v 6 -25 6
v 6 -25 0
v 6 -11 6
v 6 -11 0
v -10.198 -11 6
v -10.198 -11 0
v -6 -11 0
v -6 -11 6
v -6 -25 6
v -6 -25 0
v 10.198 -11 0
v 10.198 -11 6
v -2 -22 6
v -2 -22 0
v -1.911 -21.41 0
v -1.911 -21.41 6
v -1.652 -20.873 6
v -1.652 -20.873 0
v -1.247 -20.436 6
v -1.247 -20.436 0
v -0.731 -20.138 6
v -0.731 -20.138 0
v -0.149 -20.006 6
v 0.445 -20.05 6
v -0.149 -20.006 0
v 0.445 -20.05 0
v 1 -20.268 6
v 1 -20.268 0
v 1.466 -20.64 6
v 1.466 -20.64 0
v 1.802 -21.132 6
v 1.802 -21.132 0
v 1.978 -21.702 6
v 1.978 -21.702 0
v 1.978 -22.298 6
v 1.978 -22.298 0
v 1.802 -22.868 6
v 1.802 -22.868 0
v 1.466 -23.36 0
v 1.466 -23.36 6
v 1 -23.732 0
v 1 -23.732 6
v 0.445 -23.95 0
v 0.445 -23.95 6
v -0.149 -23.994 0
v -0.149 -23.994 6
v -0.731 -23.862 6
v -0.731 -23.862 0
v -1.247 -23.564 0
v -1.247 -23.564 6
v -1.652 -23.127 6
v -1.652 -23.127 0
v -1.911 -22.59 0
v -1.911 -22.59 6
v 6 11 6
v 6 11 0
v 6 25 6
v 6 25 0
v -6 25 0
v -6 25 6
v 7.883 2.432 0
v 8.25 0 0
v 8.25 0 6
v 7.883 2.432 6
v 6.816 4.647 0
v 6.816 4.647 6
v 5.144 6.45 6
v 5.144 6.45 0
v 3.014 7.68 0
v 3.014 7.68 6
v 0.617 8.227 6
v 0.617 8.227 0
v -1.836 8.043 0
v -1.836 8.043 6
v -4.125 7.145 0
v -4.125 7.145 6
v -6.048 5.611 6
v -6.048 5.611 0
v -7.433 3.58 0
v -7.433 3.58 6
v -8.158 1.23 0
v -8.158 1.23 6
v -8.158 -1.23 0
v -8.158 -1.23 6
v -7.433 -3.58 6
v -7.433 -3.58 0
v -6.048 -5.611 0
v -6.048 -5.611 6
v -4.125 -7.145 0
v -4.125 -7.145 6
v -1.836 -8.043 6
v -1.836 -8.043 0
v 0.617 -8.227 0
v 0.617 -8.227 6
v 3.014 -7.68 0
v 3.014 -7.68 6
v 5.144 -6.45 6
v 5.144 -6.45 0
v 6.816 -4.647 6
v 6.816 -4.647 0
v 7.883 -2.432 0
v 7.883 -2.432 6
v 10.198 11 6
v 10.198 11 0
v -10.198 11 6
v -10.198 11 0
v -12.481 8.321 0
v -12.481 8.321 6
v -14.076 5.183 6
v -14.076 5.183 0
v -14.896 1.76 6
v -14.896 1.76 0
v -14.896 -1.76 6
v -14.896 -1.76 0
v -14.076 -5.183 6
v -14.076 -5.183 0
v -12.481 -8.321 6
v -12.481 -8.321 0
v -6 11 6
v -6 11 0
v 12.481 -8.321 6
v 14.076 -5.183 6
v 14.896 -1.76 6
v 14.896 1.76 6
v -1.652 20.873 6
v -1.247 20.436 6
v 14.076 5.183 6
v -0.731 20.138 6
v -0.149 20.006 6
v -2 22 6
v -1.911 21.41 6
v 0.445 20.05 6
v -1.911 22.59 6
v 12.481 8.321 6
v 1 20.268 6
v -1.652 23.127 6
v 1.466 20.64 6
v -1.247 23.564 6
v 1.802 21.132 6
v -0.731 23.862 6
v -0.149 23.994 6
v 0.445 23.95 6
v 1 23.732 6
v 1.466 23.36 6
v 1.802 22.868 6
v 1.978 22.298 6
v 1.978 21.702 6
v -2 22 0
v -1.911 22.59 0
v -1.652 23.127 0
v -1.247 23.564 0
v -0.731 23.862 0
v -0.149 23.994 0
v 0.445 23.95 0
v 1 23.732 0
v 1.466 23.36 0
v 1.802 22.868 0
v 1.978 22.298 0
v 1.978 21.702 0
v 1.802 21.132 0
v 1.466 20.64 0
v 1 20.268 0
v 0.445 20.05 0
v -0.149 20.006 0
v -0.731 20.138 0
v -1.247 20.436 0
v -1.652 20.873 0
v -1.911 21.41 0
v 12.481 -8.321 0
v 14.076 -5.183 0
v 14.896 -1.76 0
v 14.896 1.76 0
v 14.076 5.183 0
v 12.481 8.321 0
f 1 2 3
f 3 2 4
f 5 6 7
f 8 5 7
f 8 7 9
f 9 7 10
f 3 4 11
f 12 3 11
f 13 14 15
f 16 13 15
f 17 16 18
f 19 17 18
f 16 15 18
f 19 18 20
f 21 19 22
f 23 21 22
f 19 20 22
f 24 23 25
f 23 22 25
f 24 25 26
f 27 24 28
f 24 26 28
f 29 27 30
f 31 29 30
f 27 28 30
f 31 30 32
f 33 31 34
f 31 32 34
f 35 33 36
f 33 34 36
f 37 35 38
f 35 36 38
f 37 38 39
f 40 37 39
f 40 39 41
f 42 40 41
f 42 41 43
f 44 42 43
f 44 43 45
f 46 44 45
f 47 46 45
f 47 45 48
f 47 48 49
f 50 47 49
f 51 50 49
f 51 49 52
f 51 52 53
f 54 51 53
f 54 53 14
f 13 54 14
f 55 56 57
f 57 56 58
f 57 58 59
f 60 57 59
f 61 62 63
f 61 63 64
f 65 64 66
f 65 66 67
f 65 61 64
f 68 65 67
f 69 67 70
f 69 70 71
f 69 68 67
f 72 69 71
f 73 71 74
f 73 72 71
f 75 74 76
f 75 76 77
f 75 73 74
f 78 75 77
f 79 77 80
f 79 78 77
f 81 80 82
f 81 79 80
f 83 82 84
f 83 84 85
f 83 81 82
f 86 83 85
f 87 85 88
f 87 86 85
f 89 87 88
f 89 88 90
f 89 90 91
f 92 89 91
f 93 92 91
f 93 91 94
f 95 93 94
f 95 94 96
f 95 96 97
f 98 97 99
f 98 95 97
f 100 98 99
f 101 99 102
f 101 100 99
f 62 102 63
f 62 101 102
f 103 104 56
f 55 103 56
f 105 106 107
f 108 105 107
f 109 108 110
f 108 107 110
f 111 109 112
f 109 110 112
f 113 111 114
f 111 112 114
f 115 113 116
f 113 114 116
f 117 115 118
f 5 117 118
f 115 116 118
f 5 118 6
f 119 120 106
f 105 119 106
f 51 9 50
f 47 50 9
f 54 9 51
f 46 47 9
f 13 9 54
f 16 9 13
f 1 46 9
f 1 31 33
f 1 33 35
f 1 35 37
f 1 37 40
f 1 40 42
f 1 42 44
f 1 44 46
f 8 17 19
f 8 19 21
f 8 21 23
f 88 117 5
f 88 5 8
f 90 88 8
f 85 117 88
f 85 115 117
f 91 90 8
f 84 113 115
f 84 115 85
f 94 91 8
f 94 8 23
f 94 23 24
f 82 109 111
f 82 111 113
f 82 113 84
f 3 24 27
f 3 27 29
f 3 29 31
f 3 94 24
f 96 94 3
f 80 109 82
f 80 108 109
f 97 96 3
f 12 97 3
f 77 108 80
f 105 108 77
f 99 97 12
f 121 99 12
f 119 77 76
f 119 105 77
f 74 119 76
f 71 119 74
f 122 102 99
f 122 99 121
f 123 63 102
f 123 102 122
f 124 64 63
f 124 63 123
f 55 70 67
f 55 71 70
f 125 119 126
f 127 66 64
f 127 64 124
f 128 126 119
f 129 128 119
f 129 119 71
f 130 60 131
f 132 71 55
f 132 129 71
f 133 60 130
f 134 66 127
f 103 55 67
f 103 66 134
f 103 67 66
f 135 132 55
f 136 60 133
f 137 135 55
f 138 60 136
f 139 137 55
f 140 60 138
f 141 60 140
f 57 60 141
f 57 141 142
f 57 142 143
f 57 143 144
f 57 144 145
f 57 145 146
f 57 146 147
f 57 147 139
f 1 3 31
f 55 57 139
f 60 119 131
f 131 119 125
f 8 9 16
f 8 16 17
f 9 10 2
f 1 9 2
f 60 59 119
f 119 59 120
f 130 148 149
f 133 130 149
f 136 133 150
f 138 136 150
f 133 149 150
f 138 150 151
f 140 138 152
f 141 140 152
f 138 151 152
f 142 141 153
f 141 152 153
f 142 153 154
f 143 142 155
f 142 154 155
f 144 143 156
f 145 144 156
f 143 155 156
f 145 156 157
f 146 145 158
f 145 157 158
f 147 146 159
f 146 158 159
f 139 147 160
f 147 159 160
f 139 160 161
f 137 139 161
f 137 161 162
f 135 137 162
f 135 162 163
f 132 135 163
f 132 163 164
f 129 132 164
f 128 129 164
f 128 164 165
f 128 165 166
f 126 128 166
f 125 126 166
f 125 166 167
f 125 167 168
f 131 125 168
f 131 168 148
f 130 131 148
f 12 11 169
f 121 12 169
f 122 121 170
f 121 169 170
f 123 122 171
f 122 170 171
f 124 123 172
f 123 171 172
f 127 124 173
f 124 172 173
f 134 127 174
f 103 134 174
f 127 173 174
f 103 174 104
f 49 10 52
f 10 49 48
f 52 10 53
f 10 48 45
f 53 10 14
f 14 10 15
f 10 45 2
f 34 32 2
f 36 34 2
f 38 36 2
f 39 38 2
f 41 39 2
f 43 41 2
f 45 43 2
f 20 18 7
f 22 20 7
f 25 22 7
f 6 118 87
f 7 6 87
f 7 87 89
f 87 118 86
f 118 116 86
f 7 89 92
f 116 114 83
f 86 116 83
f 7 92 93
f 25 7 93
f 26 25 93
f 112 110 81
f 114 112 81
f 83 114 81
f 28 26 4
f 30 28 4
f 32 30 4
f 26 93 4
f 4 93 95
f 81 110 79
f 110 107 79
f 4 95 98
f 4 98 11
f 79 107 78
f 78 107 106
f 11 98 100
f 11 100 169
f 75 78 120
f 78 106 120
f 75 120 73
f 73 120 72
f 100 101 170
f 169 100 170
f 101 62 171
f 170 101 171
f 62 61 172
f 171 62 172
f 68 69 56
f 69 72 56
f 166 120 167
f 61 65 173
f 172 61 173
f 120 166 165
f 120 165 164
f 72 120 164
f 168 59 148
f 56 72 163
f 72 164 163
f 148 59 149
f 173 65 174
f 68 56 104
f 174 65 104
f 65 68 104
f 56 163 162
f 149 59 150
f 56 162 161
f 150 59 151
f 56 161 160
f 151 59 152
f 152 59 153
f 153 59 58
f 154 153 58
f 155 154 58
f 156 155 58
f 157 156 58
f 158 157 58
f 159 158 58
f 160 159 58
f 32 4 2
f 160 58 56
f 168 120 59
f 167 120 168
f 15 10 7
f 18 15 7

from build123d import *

# Parameters (mm, degrees)
SKETCH1_R           = 8.25
BOSS_EXTRUDE1_DEPTH = 6
SKETCH3_R           = 2
CUT_EXTRUDE1_DEPTH  = 30.765752132


with BuildPart() as part:
    # Sketch1 → Boss-Extrude1 (new body)
    with BuildSketch(Plane.XY):
        with BuildLine():
            Line((6, -25), (6, -11))
            Line((6, -11), (10.198039027, -11))
            ThreePointArc((10.198039027, -11), (15, 0), (10.198039027, 11))
            Line((10.198039027, 11), (6, 11))
            Line((6, 11), (6, 25))
            Line((6, 25), (-6, 25))
            Line((-6, 25), (-6, 11))
            Line((-6, 11), (-10.198039027, 11))
            ThreePointArc((-10.198039027, 11), (-15, 0), (-10.198039027, -11))
            Line((-10.198039027, -11), (-6, -11))
            Line((-6, -11), (-6, -25))
            Line((-6, -25), (6, -25))
        make_face()
        Circle(SKETCH1_R, mode=Mode.SUBTRACT)
    extrude(amount=BOSS_EXTRUDE1_DEPTH)

    # Sketch3 → Cut-Extrude1 (cut, through all)
    with BuildSketch(Plane(origin=(0, 0, 0), x_dir=(-1, 0, 0), z_dir=(0, 0, -1))):
        with Locations((0, 22)):
            Circle(SKETCH3_R)
        with Locations((0, -22)):
            Circle(SKETCH3_R)
    extrude(amount=-CUT_EXTRUDE1_DEPTH, mode=Mode.SUBTRACT)


solid = part.part
